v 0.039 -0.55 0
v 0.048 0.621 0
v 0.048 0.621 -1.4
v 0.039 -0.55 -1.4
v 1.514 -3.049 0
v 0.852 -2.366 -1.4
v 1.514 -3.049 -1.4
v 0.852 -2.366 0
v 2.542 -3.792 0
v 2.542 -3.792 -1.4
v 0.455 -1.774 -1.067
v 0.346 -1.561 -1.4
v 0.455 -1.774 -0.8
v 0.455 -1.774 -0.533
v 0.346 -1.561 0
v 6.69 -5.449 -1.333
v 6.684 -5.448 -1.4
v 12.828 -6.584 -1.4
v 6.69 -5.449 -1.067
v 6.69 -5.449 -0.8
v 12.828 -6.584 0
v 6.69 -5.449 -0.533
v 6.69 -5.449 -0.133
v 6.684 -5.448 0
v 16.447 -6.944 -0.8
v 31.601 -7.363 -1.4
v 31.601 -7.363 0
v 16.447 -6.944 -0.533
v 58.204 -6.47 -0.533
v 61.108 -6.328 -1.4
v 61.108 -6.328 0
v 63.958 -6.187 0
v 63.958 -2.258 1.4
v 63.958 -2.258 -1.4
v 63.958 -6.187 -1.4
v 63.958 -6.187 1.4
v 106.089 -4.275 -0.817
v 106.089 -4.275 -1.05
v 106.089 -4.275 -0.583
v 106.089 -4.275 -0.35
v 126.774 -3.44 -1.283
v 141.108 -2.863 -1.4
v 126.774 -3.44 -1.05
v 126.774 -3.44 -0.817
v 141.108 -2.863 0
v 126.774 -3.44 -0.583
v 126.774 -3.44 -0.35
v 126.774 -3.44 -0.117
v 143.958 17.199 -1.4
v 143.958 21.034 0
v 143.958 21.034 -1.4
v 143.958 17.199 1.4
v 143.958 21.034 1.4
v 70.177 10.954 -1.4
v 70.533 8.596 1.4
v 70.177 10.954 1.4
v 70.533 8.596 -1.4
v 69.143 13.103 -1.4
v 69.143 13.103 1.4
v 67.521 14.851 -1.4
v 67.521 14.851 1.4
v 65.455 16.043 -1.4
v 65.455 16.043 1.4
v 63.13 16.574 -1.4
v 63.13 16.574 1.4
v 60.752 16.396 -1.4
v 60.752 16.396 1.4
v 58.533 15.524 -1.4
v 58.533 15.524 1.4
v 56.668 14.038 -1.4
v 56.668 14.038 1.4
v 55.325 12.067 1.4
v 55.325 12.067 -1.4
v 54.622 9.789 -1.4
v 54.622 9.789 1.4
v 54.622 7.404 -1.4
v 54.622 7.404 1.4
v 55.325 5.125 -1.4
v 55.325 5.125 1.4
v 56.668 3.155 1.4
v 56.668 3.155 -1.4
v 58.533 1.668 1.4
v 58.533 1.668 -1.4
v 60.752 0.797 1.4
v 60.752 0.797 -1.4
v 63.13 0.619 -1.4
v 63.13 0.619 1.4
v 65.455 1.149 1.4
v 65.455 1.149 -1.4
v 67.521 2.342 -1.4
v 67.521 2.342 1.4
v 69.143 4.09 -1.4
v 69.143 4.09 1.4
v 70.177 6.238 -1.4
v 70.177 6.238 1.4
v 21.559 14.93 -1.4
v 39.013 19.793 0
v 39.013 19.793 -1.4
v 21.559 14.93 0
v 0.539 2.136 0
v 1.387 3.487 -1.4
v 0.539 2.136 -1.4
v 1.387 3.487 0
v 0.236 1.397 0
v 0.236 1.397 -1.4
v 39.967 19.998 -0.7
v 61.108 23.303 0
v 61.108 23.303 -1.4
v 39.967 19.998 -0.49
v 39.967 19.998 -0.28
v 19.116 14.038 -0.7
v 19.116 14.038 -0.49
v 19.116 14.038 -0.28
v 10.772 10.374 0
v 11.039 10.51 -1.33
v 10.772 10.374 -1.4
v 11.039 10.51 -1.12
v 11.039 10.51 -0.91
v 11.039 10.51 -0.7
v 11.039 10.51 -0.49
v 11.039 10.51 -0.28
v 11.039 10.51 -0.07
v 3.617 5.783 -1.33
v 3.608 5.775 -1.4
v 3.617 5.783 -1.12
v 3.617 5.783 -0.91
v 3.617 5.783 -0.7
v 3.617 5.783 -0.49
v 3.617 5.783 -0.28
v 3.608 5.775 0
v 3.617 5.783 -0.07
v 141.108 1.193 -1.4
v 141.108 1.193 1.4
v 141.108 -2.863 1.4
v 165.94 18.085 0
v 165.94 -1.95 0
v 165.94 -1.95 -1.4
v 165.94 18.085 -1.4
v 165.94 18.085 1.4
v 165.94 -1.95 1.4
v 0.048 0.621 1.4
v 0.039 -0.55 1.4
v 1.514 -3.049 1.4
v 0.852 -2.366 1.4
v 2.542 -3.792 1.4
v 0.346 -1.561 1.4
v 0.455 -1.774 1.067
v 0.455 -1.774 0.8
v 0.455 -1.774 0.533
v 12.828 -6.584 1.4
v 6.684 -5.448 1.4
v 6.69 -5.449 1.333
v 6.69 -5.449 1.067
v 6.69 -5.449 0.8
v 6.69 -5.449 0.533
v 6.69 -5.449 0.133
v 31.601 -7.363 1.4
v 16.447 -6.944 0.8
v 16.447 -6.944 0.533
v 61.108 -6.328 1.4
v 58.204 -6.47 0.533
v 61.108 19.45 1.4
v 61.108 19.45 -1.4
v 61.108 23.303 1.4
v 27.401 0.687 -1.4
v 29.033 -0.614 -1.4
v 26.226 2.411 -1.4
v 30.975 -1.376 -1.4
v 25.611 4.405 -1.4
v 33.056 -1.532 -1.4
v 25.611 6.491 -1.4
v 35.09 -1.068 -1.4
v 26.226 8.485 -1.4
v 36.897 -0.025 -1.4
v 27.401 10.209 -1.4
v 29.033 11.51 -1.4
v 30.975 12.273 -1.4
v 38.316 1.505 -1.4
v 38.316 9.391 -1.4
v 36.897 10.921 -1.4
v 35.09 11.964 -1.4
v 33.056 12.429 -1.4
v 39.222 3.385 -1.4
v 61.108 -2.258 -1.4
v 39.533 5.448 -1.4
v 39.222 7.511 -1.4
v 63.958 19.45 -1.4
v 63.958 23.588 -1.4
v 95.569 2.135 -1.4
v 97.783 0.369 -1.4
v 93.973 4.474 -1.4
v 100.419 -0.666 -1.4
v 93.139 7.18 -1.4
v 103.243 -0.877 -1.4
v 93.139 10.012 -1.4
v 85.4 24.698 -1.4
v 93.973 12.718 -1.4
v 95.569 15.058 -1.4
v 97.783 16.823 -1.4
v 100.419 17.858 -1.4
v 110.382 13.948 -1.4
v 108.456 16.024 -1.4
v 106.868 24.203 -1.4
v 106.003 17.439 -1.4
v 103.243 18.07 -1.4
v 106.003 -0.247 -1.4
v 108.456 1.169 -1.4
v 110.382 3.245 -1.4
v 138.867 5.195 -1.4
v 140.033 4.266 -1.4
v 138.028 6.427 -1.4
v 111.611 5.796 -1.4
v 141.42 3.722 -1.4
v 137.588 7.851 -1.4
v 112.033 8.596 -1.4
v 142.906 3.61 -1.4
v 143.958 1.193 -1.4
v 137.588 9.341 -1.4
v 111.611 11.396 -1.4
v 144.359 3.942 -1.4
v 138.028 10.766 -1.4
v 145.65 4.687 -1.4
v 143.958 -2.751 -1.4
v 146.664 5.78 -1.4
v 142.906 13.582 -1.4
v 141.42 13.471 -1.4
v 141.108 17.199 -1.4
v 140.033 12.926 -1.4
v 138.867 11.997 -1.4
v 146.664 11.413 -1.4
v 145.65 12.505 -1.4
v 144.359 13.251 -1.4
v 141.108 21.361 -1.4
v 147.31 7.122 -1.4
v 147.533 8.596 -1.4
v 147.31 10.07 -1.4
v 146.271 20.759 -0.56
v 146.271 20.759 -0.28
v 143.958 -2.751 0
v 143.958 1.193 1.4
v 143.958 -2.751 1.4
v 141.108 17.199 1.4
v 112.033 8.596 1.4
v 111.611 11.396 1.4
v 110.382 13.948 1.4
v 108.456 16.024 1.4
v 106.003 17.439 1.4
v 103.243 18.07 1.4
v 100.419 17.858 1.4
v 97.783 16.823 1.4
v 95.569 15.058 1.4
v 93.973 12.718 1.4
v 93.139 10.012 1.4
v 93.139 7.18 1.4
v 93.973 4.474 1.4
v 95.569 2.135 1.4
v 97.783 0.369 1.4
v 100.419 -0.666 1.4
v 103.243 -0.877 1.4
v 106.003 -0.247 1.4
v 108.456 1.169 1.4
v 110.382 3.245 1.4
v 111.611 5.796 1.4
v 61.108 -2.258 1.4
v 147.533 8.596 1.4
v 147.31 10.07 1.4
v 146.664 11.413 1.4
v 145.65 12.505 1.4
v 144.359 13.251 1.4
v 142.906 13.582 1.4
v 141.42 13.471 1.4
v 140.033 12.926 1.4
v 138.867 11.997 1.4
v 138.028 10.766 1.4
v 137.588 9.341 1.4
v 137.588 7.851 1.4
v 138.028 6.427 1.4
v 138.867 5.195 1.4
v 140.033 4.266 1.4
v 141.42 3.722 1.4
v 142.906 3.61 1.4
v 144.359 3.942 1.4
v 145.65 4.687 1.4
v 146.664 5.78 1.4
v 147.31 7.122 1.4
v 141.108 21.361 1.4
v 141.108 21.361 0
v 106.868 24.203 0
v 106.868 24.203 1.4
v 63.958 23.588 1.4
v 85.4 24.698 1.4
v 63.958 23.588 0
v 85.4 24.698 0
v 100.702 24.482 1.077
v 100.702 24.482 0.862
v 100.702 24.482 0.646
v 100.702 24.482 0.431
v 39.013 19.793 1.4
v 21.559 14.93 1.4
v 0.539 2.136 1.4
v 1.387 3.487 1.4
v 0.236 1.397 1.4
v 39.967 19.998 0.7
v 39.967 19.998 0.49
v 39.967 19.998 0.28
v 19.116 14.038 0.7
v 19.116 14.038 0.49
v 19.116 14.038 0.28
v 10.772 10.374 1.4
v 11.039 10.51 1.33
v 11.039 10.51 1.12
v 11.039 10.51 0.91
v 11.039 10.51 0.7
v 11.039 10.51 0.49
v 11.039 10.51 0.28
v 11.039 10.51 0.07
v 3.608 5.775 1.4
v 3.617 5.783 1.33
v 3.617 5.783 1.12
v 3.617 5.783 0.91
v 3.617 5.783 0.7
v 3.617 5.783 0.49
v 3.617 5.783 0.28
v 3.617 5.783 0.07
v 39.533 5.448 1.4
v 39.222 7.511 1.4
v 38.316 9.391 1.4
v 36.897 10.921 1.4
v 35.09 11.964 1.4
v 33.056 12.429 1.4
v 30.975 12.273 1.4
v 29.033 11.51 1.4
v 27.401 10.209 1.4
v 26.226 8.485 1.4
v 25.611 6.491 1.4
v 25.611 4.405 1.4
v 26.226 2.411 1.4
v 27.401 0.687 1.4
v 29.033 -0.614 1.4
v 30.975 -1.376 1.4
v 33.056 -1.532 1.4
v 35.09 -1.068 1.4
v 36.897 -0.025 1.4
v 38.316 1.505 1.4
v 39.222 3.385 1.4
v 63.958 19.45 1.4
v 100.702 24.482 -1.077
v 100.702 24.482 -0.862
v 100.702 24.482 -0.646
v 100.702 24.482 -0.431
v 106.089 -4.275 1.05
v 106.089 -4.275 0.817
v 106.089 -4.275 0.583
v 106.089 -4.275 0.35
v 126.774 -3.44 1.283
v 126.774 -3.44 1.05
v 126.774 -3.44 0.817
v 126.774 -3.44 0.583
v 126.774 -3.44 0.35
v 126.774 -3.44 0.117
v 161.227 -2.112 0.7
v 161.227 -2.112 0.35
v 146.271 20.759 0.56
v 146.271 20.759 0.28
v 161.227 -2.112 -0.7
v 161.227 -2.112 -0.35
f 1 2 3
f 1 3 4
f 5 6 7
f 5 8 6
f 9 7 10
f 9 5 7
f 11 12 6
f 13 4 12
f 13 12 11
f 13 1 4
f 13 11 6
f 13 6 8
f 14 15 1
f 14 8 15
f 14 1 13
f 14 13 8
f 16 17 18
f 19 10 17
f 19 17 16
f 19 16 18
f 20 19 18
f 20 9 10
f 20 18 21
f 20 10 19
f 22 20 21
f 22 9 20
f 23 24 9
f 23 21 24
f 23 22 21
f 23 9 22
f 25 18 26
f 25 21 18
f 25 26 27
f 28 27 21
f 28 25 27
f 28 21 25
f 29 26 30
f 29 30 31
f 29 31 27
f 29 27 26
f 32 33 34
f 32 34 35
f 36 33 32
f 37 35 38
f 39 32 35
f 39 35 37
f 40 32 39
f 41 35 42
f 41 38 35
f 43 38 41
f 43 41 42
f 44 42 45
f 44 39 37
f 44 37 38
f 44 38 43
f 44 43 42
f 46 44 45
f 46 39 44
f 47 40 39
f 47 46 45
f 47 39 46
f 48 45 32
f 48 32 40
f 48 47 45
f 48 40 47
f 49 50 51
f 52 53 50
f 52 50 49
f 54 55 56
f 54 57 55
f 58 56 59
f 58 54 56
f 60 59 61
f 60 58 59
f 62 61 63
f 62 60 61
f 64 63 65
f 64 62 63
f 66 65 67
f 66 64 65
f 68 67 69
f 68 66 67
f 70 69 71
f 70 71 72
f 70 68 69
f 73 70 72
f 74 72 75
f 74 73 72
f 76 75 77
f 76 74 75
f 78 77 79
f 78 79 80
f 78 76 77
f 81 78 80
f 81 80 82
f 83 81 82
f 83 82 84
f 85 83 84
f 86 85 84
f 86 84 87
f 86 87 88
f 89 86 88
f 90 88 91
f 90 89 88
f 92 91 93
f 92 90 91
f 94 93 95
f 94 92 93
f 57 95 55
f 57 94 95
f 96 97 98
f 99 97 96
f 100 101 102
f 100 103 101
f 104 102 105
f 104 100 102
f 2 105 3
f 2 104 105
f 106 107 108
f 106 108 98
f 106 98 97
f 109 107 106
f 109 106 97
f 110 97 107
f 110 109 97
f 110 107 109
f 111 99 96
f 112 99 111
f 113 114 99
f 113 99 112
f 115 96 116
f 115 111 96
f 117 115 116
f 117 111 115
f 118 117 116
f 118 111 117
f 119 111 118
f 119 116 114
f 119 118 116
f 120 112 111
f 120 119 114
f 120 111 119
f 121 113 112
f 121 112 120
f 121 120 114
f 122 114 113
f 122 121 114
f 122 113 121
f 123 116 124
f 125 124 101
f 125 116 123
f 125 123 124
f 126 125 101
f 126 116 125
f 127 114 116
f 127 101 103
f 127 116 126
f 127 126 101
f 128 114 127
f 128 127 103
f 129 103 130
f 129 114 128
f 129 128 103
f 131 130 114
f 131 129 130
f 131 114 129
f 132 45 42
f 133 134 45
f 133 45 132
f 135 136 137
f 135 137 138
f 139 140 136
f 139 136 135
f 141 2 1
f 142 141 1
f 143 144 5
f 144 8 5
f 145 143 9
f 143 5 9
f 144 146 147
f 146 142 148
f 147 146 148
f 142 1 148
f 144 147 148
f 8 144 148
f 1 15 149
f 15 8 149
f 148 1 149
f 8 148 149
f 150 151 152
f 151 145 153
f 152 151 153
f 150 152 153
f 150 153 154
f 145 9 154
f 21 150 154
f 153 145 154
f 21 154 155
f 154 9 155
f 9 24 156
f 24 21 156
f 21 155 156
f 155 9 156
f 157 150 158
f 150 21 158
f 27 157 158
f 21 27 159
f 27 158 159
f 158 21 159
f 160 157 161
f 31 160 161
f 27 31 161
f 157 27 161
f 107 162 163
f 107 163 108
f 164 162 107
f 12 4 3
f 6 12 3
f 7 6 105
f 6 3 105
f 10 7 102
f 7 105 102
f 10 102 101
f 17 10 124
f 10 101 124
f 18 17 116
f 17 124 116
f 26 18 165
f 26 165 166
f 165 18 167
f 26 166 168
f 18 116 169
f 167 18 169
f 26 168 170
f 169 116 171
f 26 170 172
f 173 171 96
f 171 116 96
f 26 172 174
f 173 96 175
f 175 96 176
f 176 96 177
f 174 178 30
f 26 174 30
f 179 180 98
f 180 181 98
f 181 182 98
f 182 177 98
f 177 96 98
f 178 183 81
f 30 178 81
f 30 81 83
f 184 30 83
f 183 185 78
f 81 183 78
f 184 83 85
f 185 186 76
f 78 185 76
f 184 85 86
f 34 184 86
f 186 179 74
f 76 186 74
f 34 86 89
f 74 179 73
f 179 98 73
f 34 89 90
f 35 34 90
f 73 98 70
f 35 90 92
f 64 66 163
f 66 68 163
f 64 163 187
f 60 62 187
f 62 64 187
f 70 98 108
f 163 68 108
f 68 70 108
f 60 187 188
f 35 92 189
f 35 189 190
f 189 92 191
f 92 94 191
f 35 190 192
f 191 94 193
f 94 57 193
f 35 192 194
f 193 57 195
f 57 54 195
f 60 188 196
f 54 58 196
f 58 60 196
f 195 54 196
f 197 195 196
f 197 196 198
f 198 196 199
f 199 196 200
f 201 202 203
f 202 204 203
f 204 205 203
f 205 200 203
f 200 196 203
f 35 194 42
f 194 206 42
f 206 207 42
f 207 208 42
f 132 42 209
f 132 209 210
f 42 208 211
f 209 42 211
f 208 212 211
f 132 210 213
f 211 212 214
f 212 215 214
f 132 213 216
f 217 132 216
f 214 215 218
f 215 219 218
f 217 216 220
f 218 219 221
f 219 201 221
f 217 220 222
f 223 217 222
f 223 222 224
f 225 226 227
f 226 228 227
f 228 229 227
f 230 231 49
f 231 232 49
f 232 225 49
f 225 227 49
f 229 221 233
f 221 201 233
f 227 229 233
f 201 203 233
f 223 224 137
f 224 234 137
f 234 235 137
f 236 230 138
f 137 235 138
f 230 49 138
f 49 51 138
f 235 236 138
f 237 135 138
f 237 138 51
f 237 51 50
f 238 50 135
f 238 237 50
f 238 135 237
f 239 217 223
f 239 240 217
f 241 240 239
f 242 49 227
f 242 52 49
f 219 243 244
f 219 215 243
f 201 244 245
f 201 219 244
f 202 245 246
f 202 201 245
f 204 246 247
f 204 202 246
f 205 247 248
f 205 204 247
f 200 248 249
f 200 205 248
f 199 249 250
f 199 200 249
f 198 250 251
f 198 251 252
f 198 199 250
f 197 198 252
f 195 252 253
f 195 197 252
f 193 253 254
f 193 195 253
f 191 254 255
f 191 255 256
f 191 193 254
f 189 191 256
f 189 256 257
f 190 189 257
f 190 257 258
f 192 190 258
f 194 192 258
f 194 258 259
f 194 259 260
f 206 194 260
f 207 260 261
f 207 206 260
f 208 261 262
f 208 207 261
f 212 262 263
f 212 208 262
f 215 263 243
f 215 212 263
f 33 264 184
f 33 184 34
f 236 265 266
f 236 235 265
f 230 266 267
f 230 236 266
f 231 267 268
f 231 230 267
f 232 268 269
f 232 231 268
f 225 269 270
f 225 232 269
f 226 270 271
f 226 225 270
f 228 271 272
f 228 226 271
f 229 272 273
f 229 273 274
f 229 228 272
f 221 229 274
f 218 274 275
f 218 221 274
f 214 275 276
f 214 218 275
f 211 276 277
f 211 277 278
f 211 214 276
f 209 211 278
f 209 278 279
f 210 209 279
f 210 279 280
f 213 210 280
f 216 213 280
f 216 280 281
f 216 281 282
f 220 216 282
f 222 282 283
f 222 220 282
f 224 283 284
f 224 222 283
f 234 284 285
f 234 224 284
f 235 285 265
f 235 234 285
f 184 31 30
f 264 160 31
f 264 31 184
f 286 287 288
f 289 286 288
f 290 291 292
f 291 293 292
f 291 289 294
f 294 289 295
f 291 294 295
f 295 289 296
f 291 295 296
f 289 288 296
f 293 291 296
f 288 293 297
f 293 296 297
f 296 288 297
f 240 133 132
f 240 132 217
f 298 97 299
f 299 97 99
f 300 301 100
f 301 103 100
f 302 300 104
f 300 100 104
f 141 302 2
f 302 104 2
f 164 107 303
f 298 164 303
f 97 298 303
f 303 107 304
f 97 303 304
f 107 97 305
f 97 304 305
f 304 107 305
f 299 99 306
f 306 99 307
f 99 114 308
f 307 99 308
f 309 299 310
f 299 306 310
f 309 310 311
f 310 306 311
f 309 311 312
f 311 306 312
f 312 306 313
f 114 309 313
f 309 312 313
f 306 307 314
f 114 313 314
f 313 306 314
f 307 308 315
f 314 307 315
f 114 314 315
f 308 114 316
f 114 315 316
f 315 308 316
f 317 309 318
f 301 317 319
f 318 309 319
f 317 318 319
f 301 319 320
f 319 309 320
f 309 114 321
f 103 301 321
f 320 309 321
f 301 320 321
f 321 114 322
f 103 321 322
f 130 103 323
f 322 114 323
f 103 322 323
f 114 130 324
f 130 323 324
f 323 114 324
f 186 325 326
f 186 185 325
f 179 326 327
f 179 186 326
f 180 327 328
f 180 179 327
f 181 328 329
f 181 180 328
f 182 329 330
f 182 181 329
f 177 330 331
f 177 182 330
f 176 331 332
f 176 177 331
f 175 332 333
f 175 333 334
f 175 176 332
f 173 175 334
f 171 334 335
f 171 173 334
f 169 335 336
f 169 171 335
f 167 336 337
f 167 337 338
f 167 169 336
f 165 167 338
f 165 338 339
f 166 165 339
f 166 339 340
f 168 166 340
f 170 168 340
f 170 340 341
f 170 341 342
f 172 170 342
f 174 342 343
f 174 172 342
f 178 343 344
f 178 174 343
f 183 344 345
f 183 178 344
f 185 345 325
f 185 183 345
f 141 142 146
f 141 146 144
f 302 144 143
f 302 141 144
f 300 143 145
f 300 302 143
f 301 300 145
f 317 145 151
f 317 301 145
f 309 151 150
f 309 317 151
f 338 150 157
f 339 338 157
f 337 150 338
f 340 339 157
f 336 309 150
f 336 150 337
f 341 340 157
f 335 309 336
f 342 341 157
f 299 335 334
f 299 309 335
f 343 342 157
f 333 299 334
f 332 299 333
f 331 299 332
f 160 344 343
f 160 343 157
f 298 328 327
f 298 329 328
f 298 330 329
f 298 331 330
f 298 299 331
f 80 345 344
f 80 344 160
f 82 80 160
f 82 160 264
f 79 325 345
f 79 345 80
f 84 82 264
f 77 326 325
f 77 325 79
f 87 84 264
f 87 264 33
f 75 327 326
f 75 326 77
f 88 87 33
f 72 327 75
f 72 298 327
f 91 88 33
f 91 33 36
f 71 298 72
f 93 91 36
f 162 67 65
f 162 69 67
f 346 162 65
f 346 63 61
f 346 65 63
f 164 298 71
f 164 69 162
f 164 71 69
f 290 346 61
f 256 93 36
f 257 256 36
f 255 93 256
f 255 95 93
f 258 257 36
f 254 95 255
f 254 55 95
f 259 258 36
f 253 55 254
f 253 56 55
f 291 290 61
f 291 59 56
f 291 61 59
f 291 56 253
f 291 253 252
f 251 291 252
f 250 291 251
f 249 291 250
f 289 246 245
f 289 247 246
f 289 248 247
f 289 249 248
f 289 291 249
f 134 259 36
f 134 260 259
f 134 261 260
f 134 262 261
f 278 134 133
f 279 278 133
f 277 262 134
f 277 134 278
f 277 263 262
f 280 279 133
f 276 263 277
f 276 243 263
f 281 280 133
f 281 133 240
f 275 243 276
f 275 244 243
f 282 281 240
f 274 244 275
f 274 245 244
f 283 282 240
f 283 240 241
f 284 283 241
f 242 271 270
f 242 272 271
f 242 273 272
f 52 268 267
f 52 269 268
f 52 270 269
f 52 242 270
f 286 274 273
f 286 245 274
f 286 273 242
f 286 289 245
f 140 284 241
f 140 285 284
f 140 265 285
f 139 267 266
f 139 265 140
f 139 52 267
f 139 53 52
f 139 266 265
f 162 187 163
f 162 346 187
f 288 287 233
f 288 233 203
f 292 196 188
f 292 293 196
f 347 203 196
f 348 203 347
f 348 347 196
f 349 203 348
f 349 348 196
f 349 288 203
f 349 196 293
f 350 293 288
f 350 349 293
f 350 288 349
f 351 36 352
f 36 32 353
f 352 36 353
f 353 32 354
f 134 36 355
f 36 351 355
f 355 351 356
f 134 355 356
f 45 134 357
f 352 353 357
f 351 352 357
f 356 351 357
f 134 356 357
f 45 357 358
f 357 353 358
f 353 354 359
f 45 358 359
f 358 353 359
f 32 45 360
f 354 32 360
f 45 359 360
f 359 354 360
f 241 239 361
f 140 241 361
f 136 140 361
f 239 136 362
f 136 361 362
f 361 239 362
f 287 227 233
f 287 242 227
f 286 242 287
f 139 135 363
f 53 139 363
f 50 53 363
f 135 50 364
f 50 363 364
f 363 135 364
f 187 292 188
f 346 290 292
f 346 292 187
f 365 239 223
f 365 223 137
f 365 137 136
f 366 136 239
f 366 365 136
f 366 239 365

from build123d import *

# Parameters (mm, degrees)
SKETCH_1_R      = 7
SKETCH_1_R_2    = 8
SKETCH_1_R_3    = 9.5
SKETCH_1_R_4    = 5
EXTRUDE_1_DEPTH = 1.4


with BuildPart() as part:
    # Эскиз1 → Бобышка-Вытянуть1 (new, symmetric)
    with BuildSketch(Plane.XY):
        with BuildLine():
            Line((63.957619318, 19.450139662), (61.107619318, 19.450139662))
            Line((61.107619318, 19.450139662), (61.107619318, 23.303137173))
            add(Edge.make_bspline(
                [(61.107619318, 23.303137173), (59.917945614, 23.176751945), (56.739740439, 22.81448979), (51.605762688, 22.119065522), (45.744400311, 21.156564432), (39.995857594, 20.03537139), (34.397919842, 18.756316235), (29.010382103, 17.327615608), (23.925798408, 15.771864922), (19.27067884, 14.134269435), (15.179098391, 12.483335438), (11.74047579, 10.895610996), (8.959371869, 9.429577366), (6.76089118, 8.1086032), (5.033709748, 6.924638056), (3.671694933, 5.854229665), (2.592101123, 4.871305369), (1.738175668, 3.952595744), (1.06987083, 3.080946374), (0.57164541, 2.241622103), (0.215773899, 1.430785398), (0.102255581, 0.883241695), (0.047975, 0.621425001)],
                knots=[0.740090669, 0.740090669, 0.740090669, 0.740090669, 0.7539832, 0.77723469, 0.800246382, 0.822950709, 0.845237155, 0.866915896, 0.887662335, 0.906968281, 0.924203157, 0.938878975, 0.950931611, 0.960693484, 0.968646729, 0.975232933, 0.980794744, 0.985583761, 0.989781539, 0.993521313, 0.996902113, 1, 1, 1, 1], degree=3))
            add(Edge.make_bspline(
                [(0.047975, 0.621425001), (0.02271382, 0.373490086), (-0.027820789, -0.122499974), (0.077991212, -0.884434589), (0.34969565, -1.63883807), (0.814331135, -2.365068923), (1.46348078, -3.039275244), (2.290973016, -3.660999469), (3.30592875, -4.23577962), (4.535255619, -4.773674143), (6.029745688, -5.282192164), (7.868981215, -5.765316676), (10.168831391, -6.221716592), (13.075438188, -6.63961873), (16.728115362, -6.992956737), (21.189952096, -7.247345144), (26.399984415, -7.376638848), (32.197398564, -7.376256913), (38.397806759, -7.261436579), (44.857621768, -7.056641358), (51.486543096, -6.786453532), (56.920566709, -6.533358441), (60.139839208, -6.376114839), (61.107619318, -6.32836923)],
                knots=[0, 0, 0, 0, 0.002941446, 0.005884319, 0.00901613, 0.012364547, 0.016007934, 0.020036845, 0.024573728, 0.029783835, 0.03589701, 0.04324044, 0.052275965, 0.063634589, 0.077983176, 0.095698161, 0.116520086, 0.13966073, 0.16431217, 0.18991889, 0.216157201, 0.242837762, 0.254306514, 0.254306514, 0.254306514, 0.254306514], degree=3))
            Line((61.107619318, -6.32836923), (61.107619318, -2.257745247))
            Line((61.107619318, -2.257745247), (63.957619318, -2.257745247))
            Line((63.957619318, -2.257745247), (63.957619318, -6.186566126))
            add(Edge.make_bspline(
                [(63.957619318, -6.186566126), (64.317823095, -6.168514758), (66.969747676, -6.035316313), (71.910772709, -5.784005174), (78.771375576, -5.439680449), (85.610498609, -5.110951246), (92.432107589, -4.804953317), (99.25503119, -4.531981644), (106.097378404, -4.278274658), (112.96921168, -4.00308991), (119.864404254, -3.723176166), (126.773860473, -3.440067276), (133.855552455, -3.151608468), (138.633361552, -2.960411351), (141.107619318, -2.86287629)],
                knots=[0.265564796, 0.265564796, 0.265564796, 0.265564796, 0.269833583, 0.296993022, 0.324123272, 0.351139107, 0.378035509, 0.404946016, 0.431960837, 0.459078395, 0.4863474, 0.51364083, 0.540928595, 0.570237104, 0.570237104, 0.570237104, 0.570237104], degree=3))
            Line((141.107619318, -2.86287629), (141.107619318, 1.193130543))
            Line((141.107619318, 1.193130543), (143.957619318, 1.193130543))
            Line((143.957619318, 1.193130543), (143.957619318, -2.751209627))
            add(Edge.make_bspline(
                [(143.957619318, -2.751209627), (145.13020609, -2.705557458), (148.596084852, -2.571725453), (154.352602411, -2.355626415), (160.507662095, -2.135075484), (164.369425992, -2.00299999), (165.940456932, -1.950382964)],
                knots=[0.581490104, 0.581490104, 0.581490104, 0.581490104, 0.595379569, 0.622543445, 0.64967326, 0.668278692, 0.668278692, 0.668278692, 0.668278692], degree=3))
            Line((165.940456932, -1.950382964), (165.940456932, 7.49391084))
            Line((165.940456932, 7.49391084), (165.940456932, 18.08535451))
            add(Edge.make_bspline(
                [(165.940456932, 18.08535451), (165.930512987, 18.08685322), (163.740114226, 18.416932974), (159.368680729, 19.054501815), (152.821805128, 19.944885603), (147.683892721, 20.591912914), (144.728786809, 20.943344409), (143.957619318, 21.033629847)],
                knots=[0.332761263, 0.332761263, 0.332761263, 0.332761263, 0.332878042, 0.358484538, 0.384061186, 0.409602822, 0.418619192, 0.418619192, 0.418619192, 0.418619192], degree=3))
            Line((143.957619318, 21.033629847), (143.957619318, 17.19883932))
            Line((143.957619318, 17.19883932), (141.107619318, 17.19883932))
            Line((141.107619318, 17.19883932), (141.107619318, 21.360787161))
            add(Edge.make_bspline(
                [(141.107619318, 21.360787161), (140.647203073, 21.412583326), (138.008124909, 21.706530989), (133.19183673, 22.212004255), (126.658683026, 22.825721434), (120.136770918, 23.363973271), (113.62856714, 23.824677329), (107.152732037, 24.200242598), (100.741095693, 24.498399513), (94.411752715, 24.686649771), (88.155917993, 24.740095652), (81.949043055, 24.658849145), (75.780520591, 24.441013809), (69.785413798, 24.089605746), (65.850842722, 23.766532071), (63.957619318, 23.588464287)],
                knots=[0.429723551, 0.429723551, 0.429723551, 0.429723551, 0.435103874, 0.460559416, 0.485959195, 0.51130307, 0.536551515, 0.561723366, 0.586628867, 0.611085431, 0.6352512, 0.659272176, 0.683163753, 0.706922144, 0.729003809, 0.729003809, 0.729003809, 0.729003809], degree=3))
            Line((63.957619318, 23.588464287), (63.957619318, 19.450139662))
        make_face()
        with Locations((32.532619318, 5.448144701)):
            Circle(SKETCH_1_R, mode=Mode.SUBTRACT)
        with Locations((62.532619318, 8.596197208)):
            Circle(SKETCH_1_R_2, mode=Mode.SUBTRACT)
        with Locations((102.532619318, 8.596197208)):
            Circle(SKETCH_1_R_3, mode=Mode.SUBTRACT)
        with Locations((142.532619318, 8.596197208)):
            Circle(SKETCH_1_R_4, mode=Mode.SUBTRACT)
    extrude(amount=EXTRUDE_1_DEPTH, both=True)


solid = part.part
